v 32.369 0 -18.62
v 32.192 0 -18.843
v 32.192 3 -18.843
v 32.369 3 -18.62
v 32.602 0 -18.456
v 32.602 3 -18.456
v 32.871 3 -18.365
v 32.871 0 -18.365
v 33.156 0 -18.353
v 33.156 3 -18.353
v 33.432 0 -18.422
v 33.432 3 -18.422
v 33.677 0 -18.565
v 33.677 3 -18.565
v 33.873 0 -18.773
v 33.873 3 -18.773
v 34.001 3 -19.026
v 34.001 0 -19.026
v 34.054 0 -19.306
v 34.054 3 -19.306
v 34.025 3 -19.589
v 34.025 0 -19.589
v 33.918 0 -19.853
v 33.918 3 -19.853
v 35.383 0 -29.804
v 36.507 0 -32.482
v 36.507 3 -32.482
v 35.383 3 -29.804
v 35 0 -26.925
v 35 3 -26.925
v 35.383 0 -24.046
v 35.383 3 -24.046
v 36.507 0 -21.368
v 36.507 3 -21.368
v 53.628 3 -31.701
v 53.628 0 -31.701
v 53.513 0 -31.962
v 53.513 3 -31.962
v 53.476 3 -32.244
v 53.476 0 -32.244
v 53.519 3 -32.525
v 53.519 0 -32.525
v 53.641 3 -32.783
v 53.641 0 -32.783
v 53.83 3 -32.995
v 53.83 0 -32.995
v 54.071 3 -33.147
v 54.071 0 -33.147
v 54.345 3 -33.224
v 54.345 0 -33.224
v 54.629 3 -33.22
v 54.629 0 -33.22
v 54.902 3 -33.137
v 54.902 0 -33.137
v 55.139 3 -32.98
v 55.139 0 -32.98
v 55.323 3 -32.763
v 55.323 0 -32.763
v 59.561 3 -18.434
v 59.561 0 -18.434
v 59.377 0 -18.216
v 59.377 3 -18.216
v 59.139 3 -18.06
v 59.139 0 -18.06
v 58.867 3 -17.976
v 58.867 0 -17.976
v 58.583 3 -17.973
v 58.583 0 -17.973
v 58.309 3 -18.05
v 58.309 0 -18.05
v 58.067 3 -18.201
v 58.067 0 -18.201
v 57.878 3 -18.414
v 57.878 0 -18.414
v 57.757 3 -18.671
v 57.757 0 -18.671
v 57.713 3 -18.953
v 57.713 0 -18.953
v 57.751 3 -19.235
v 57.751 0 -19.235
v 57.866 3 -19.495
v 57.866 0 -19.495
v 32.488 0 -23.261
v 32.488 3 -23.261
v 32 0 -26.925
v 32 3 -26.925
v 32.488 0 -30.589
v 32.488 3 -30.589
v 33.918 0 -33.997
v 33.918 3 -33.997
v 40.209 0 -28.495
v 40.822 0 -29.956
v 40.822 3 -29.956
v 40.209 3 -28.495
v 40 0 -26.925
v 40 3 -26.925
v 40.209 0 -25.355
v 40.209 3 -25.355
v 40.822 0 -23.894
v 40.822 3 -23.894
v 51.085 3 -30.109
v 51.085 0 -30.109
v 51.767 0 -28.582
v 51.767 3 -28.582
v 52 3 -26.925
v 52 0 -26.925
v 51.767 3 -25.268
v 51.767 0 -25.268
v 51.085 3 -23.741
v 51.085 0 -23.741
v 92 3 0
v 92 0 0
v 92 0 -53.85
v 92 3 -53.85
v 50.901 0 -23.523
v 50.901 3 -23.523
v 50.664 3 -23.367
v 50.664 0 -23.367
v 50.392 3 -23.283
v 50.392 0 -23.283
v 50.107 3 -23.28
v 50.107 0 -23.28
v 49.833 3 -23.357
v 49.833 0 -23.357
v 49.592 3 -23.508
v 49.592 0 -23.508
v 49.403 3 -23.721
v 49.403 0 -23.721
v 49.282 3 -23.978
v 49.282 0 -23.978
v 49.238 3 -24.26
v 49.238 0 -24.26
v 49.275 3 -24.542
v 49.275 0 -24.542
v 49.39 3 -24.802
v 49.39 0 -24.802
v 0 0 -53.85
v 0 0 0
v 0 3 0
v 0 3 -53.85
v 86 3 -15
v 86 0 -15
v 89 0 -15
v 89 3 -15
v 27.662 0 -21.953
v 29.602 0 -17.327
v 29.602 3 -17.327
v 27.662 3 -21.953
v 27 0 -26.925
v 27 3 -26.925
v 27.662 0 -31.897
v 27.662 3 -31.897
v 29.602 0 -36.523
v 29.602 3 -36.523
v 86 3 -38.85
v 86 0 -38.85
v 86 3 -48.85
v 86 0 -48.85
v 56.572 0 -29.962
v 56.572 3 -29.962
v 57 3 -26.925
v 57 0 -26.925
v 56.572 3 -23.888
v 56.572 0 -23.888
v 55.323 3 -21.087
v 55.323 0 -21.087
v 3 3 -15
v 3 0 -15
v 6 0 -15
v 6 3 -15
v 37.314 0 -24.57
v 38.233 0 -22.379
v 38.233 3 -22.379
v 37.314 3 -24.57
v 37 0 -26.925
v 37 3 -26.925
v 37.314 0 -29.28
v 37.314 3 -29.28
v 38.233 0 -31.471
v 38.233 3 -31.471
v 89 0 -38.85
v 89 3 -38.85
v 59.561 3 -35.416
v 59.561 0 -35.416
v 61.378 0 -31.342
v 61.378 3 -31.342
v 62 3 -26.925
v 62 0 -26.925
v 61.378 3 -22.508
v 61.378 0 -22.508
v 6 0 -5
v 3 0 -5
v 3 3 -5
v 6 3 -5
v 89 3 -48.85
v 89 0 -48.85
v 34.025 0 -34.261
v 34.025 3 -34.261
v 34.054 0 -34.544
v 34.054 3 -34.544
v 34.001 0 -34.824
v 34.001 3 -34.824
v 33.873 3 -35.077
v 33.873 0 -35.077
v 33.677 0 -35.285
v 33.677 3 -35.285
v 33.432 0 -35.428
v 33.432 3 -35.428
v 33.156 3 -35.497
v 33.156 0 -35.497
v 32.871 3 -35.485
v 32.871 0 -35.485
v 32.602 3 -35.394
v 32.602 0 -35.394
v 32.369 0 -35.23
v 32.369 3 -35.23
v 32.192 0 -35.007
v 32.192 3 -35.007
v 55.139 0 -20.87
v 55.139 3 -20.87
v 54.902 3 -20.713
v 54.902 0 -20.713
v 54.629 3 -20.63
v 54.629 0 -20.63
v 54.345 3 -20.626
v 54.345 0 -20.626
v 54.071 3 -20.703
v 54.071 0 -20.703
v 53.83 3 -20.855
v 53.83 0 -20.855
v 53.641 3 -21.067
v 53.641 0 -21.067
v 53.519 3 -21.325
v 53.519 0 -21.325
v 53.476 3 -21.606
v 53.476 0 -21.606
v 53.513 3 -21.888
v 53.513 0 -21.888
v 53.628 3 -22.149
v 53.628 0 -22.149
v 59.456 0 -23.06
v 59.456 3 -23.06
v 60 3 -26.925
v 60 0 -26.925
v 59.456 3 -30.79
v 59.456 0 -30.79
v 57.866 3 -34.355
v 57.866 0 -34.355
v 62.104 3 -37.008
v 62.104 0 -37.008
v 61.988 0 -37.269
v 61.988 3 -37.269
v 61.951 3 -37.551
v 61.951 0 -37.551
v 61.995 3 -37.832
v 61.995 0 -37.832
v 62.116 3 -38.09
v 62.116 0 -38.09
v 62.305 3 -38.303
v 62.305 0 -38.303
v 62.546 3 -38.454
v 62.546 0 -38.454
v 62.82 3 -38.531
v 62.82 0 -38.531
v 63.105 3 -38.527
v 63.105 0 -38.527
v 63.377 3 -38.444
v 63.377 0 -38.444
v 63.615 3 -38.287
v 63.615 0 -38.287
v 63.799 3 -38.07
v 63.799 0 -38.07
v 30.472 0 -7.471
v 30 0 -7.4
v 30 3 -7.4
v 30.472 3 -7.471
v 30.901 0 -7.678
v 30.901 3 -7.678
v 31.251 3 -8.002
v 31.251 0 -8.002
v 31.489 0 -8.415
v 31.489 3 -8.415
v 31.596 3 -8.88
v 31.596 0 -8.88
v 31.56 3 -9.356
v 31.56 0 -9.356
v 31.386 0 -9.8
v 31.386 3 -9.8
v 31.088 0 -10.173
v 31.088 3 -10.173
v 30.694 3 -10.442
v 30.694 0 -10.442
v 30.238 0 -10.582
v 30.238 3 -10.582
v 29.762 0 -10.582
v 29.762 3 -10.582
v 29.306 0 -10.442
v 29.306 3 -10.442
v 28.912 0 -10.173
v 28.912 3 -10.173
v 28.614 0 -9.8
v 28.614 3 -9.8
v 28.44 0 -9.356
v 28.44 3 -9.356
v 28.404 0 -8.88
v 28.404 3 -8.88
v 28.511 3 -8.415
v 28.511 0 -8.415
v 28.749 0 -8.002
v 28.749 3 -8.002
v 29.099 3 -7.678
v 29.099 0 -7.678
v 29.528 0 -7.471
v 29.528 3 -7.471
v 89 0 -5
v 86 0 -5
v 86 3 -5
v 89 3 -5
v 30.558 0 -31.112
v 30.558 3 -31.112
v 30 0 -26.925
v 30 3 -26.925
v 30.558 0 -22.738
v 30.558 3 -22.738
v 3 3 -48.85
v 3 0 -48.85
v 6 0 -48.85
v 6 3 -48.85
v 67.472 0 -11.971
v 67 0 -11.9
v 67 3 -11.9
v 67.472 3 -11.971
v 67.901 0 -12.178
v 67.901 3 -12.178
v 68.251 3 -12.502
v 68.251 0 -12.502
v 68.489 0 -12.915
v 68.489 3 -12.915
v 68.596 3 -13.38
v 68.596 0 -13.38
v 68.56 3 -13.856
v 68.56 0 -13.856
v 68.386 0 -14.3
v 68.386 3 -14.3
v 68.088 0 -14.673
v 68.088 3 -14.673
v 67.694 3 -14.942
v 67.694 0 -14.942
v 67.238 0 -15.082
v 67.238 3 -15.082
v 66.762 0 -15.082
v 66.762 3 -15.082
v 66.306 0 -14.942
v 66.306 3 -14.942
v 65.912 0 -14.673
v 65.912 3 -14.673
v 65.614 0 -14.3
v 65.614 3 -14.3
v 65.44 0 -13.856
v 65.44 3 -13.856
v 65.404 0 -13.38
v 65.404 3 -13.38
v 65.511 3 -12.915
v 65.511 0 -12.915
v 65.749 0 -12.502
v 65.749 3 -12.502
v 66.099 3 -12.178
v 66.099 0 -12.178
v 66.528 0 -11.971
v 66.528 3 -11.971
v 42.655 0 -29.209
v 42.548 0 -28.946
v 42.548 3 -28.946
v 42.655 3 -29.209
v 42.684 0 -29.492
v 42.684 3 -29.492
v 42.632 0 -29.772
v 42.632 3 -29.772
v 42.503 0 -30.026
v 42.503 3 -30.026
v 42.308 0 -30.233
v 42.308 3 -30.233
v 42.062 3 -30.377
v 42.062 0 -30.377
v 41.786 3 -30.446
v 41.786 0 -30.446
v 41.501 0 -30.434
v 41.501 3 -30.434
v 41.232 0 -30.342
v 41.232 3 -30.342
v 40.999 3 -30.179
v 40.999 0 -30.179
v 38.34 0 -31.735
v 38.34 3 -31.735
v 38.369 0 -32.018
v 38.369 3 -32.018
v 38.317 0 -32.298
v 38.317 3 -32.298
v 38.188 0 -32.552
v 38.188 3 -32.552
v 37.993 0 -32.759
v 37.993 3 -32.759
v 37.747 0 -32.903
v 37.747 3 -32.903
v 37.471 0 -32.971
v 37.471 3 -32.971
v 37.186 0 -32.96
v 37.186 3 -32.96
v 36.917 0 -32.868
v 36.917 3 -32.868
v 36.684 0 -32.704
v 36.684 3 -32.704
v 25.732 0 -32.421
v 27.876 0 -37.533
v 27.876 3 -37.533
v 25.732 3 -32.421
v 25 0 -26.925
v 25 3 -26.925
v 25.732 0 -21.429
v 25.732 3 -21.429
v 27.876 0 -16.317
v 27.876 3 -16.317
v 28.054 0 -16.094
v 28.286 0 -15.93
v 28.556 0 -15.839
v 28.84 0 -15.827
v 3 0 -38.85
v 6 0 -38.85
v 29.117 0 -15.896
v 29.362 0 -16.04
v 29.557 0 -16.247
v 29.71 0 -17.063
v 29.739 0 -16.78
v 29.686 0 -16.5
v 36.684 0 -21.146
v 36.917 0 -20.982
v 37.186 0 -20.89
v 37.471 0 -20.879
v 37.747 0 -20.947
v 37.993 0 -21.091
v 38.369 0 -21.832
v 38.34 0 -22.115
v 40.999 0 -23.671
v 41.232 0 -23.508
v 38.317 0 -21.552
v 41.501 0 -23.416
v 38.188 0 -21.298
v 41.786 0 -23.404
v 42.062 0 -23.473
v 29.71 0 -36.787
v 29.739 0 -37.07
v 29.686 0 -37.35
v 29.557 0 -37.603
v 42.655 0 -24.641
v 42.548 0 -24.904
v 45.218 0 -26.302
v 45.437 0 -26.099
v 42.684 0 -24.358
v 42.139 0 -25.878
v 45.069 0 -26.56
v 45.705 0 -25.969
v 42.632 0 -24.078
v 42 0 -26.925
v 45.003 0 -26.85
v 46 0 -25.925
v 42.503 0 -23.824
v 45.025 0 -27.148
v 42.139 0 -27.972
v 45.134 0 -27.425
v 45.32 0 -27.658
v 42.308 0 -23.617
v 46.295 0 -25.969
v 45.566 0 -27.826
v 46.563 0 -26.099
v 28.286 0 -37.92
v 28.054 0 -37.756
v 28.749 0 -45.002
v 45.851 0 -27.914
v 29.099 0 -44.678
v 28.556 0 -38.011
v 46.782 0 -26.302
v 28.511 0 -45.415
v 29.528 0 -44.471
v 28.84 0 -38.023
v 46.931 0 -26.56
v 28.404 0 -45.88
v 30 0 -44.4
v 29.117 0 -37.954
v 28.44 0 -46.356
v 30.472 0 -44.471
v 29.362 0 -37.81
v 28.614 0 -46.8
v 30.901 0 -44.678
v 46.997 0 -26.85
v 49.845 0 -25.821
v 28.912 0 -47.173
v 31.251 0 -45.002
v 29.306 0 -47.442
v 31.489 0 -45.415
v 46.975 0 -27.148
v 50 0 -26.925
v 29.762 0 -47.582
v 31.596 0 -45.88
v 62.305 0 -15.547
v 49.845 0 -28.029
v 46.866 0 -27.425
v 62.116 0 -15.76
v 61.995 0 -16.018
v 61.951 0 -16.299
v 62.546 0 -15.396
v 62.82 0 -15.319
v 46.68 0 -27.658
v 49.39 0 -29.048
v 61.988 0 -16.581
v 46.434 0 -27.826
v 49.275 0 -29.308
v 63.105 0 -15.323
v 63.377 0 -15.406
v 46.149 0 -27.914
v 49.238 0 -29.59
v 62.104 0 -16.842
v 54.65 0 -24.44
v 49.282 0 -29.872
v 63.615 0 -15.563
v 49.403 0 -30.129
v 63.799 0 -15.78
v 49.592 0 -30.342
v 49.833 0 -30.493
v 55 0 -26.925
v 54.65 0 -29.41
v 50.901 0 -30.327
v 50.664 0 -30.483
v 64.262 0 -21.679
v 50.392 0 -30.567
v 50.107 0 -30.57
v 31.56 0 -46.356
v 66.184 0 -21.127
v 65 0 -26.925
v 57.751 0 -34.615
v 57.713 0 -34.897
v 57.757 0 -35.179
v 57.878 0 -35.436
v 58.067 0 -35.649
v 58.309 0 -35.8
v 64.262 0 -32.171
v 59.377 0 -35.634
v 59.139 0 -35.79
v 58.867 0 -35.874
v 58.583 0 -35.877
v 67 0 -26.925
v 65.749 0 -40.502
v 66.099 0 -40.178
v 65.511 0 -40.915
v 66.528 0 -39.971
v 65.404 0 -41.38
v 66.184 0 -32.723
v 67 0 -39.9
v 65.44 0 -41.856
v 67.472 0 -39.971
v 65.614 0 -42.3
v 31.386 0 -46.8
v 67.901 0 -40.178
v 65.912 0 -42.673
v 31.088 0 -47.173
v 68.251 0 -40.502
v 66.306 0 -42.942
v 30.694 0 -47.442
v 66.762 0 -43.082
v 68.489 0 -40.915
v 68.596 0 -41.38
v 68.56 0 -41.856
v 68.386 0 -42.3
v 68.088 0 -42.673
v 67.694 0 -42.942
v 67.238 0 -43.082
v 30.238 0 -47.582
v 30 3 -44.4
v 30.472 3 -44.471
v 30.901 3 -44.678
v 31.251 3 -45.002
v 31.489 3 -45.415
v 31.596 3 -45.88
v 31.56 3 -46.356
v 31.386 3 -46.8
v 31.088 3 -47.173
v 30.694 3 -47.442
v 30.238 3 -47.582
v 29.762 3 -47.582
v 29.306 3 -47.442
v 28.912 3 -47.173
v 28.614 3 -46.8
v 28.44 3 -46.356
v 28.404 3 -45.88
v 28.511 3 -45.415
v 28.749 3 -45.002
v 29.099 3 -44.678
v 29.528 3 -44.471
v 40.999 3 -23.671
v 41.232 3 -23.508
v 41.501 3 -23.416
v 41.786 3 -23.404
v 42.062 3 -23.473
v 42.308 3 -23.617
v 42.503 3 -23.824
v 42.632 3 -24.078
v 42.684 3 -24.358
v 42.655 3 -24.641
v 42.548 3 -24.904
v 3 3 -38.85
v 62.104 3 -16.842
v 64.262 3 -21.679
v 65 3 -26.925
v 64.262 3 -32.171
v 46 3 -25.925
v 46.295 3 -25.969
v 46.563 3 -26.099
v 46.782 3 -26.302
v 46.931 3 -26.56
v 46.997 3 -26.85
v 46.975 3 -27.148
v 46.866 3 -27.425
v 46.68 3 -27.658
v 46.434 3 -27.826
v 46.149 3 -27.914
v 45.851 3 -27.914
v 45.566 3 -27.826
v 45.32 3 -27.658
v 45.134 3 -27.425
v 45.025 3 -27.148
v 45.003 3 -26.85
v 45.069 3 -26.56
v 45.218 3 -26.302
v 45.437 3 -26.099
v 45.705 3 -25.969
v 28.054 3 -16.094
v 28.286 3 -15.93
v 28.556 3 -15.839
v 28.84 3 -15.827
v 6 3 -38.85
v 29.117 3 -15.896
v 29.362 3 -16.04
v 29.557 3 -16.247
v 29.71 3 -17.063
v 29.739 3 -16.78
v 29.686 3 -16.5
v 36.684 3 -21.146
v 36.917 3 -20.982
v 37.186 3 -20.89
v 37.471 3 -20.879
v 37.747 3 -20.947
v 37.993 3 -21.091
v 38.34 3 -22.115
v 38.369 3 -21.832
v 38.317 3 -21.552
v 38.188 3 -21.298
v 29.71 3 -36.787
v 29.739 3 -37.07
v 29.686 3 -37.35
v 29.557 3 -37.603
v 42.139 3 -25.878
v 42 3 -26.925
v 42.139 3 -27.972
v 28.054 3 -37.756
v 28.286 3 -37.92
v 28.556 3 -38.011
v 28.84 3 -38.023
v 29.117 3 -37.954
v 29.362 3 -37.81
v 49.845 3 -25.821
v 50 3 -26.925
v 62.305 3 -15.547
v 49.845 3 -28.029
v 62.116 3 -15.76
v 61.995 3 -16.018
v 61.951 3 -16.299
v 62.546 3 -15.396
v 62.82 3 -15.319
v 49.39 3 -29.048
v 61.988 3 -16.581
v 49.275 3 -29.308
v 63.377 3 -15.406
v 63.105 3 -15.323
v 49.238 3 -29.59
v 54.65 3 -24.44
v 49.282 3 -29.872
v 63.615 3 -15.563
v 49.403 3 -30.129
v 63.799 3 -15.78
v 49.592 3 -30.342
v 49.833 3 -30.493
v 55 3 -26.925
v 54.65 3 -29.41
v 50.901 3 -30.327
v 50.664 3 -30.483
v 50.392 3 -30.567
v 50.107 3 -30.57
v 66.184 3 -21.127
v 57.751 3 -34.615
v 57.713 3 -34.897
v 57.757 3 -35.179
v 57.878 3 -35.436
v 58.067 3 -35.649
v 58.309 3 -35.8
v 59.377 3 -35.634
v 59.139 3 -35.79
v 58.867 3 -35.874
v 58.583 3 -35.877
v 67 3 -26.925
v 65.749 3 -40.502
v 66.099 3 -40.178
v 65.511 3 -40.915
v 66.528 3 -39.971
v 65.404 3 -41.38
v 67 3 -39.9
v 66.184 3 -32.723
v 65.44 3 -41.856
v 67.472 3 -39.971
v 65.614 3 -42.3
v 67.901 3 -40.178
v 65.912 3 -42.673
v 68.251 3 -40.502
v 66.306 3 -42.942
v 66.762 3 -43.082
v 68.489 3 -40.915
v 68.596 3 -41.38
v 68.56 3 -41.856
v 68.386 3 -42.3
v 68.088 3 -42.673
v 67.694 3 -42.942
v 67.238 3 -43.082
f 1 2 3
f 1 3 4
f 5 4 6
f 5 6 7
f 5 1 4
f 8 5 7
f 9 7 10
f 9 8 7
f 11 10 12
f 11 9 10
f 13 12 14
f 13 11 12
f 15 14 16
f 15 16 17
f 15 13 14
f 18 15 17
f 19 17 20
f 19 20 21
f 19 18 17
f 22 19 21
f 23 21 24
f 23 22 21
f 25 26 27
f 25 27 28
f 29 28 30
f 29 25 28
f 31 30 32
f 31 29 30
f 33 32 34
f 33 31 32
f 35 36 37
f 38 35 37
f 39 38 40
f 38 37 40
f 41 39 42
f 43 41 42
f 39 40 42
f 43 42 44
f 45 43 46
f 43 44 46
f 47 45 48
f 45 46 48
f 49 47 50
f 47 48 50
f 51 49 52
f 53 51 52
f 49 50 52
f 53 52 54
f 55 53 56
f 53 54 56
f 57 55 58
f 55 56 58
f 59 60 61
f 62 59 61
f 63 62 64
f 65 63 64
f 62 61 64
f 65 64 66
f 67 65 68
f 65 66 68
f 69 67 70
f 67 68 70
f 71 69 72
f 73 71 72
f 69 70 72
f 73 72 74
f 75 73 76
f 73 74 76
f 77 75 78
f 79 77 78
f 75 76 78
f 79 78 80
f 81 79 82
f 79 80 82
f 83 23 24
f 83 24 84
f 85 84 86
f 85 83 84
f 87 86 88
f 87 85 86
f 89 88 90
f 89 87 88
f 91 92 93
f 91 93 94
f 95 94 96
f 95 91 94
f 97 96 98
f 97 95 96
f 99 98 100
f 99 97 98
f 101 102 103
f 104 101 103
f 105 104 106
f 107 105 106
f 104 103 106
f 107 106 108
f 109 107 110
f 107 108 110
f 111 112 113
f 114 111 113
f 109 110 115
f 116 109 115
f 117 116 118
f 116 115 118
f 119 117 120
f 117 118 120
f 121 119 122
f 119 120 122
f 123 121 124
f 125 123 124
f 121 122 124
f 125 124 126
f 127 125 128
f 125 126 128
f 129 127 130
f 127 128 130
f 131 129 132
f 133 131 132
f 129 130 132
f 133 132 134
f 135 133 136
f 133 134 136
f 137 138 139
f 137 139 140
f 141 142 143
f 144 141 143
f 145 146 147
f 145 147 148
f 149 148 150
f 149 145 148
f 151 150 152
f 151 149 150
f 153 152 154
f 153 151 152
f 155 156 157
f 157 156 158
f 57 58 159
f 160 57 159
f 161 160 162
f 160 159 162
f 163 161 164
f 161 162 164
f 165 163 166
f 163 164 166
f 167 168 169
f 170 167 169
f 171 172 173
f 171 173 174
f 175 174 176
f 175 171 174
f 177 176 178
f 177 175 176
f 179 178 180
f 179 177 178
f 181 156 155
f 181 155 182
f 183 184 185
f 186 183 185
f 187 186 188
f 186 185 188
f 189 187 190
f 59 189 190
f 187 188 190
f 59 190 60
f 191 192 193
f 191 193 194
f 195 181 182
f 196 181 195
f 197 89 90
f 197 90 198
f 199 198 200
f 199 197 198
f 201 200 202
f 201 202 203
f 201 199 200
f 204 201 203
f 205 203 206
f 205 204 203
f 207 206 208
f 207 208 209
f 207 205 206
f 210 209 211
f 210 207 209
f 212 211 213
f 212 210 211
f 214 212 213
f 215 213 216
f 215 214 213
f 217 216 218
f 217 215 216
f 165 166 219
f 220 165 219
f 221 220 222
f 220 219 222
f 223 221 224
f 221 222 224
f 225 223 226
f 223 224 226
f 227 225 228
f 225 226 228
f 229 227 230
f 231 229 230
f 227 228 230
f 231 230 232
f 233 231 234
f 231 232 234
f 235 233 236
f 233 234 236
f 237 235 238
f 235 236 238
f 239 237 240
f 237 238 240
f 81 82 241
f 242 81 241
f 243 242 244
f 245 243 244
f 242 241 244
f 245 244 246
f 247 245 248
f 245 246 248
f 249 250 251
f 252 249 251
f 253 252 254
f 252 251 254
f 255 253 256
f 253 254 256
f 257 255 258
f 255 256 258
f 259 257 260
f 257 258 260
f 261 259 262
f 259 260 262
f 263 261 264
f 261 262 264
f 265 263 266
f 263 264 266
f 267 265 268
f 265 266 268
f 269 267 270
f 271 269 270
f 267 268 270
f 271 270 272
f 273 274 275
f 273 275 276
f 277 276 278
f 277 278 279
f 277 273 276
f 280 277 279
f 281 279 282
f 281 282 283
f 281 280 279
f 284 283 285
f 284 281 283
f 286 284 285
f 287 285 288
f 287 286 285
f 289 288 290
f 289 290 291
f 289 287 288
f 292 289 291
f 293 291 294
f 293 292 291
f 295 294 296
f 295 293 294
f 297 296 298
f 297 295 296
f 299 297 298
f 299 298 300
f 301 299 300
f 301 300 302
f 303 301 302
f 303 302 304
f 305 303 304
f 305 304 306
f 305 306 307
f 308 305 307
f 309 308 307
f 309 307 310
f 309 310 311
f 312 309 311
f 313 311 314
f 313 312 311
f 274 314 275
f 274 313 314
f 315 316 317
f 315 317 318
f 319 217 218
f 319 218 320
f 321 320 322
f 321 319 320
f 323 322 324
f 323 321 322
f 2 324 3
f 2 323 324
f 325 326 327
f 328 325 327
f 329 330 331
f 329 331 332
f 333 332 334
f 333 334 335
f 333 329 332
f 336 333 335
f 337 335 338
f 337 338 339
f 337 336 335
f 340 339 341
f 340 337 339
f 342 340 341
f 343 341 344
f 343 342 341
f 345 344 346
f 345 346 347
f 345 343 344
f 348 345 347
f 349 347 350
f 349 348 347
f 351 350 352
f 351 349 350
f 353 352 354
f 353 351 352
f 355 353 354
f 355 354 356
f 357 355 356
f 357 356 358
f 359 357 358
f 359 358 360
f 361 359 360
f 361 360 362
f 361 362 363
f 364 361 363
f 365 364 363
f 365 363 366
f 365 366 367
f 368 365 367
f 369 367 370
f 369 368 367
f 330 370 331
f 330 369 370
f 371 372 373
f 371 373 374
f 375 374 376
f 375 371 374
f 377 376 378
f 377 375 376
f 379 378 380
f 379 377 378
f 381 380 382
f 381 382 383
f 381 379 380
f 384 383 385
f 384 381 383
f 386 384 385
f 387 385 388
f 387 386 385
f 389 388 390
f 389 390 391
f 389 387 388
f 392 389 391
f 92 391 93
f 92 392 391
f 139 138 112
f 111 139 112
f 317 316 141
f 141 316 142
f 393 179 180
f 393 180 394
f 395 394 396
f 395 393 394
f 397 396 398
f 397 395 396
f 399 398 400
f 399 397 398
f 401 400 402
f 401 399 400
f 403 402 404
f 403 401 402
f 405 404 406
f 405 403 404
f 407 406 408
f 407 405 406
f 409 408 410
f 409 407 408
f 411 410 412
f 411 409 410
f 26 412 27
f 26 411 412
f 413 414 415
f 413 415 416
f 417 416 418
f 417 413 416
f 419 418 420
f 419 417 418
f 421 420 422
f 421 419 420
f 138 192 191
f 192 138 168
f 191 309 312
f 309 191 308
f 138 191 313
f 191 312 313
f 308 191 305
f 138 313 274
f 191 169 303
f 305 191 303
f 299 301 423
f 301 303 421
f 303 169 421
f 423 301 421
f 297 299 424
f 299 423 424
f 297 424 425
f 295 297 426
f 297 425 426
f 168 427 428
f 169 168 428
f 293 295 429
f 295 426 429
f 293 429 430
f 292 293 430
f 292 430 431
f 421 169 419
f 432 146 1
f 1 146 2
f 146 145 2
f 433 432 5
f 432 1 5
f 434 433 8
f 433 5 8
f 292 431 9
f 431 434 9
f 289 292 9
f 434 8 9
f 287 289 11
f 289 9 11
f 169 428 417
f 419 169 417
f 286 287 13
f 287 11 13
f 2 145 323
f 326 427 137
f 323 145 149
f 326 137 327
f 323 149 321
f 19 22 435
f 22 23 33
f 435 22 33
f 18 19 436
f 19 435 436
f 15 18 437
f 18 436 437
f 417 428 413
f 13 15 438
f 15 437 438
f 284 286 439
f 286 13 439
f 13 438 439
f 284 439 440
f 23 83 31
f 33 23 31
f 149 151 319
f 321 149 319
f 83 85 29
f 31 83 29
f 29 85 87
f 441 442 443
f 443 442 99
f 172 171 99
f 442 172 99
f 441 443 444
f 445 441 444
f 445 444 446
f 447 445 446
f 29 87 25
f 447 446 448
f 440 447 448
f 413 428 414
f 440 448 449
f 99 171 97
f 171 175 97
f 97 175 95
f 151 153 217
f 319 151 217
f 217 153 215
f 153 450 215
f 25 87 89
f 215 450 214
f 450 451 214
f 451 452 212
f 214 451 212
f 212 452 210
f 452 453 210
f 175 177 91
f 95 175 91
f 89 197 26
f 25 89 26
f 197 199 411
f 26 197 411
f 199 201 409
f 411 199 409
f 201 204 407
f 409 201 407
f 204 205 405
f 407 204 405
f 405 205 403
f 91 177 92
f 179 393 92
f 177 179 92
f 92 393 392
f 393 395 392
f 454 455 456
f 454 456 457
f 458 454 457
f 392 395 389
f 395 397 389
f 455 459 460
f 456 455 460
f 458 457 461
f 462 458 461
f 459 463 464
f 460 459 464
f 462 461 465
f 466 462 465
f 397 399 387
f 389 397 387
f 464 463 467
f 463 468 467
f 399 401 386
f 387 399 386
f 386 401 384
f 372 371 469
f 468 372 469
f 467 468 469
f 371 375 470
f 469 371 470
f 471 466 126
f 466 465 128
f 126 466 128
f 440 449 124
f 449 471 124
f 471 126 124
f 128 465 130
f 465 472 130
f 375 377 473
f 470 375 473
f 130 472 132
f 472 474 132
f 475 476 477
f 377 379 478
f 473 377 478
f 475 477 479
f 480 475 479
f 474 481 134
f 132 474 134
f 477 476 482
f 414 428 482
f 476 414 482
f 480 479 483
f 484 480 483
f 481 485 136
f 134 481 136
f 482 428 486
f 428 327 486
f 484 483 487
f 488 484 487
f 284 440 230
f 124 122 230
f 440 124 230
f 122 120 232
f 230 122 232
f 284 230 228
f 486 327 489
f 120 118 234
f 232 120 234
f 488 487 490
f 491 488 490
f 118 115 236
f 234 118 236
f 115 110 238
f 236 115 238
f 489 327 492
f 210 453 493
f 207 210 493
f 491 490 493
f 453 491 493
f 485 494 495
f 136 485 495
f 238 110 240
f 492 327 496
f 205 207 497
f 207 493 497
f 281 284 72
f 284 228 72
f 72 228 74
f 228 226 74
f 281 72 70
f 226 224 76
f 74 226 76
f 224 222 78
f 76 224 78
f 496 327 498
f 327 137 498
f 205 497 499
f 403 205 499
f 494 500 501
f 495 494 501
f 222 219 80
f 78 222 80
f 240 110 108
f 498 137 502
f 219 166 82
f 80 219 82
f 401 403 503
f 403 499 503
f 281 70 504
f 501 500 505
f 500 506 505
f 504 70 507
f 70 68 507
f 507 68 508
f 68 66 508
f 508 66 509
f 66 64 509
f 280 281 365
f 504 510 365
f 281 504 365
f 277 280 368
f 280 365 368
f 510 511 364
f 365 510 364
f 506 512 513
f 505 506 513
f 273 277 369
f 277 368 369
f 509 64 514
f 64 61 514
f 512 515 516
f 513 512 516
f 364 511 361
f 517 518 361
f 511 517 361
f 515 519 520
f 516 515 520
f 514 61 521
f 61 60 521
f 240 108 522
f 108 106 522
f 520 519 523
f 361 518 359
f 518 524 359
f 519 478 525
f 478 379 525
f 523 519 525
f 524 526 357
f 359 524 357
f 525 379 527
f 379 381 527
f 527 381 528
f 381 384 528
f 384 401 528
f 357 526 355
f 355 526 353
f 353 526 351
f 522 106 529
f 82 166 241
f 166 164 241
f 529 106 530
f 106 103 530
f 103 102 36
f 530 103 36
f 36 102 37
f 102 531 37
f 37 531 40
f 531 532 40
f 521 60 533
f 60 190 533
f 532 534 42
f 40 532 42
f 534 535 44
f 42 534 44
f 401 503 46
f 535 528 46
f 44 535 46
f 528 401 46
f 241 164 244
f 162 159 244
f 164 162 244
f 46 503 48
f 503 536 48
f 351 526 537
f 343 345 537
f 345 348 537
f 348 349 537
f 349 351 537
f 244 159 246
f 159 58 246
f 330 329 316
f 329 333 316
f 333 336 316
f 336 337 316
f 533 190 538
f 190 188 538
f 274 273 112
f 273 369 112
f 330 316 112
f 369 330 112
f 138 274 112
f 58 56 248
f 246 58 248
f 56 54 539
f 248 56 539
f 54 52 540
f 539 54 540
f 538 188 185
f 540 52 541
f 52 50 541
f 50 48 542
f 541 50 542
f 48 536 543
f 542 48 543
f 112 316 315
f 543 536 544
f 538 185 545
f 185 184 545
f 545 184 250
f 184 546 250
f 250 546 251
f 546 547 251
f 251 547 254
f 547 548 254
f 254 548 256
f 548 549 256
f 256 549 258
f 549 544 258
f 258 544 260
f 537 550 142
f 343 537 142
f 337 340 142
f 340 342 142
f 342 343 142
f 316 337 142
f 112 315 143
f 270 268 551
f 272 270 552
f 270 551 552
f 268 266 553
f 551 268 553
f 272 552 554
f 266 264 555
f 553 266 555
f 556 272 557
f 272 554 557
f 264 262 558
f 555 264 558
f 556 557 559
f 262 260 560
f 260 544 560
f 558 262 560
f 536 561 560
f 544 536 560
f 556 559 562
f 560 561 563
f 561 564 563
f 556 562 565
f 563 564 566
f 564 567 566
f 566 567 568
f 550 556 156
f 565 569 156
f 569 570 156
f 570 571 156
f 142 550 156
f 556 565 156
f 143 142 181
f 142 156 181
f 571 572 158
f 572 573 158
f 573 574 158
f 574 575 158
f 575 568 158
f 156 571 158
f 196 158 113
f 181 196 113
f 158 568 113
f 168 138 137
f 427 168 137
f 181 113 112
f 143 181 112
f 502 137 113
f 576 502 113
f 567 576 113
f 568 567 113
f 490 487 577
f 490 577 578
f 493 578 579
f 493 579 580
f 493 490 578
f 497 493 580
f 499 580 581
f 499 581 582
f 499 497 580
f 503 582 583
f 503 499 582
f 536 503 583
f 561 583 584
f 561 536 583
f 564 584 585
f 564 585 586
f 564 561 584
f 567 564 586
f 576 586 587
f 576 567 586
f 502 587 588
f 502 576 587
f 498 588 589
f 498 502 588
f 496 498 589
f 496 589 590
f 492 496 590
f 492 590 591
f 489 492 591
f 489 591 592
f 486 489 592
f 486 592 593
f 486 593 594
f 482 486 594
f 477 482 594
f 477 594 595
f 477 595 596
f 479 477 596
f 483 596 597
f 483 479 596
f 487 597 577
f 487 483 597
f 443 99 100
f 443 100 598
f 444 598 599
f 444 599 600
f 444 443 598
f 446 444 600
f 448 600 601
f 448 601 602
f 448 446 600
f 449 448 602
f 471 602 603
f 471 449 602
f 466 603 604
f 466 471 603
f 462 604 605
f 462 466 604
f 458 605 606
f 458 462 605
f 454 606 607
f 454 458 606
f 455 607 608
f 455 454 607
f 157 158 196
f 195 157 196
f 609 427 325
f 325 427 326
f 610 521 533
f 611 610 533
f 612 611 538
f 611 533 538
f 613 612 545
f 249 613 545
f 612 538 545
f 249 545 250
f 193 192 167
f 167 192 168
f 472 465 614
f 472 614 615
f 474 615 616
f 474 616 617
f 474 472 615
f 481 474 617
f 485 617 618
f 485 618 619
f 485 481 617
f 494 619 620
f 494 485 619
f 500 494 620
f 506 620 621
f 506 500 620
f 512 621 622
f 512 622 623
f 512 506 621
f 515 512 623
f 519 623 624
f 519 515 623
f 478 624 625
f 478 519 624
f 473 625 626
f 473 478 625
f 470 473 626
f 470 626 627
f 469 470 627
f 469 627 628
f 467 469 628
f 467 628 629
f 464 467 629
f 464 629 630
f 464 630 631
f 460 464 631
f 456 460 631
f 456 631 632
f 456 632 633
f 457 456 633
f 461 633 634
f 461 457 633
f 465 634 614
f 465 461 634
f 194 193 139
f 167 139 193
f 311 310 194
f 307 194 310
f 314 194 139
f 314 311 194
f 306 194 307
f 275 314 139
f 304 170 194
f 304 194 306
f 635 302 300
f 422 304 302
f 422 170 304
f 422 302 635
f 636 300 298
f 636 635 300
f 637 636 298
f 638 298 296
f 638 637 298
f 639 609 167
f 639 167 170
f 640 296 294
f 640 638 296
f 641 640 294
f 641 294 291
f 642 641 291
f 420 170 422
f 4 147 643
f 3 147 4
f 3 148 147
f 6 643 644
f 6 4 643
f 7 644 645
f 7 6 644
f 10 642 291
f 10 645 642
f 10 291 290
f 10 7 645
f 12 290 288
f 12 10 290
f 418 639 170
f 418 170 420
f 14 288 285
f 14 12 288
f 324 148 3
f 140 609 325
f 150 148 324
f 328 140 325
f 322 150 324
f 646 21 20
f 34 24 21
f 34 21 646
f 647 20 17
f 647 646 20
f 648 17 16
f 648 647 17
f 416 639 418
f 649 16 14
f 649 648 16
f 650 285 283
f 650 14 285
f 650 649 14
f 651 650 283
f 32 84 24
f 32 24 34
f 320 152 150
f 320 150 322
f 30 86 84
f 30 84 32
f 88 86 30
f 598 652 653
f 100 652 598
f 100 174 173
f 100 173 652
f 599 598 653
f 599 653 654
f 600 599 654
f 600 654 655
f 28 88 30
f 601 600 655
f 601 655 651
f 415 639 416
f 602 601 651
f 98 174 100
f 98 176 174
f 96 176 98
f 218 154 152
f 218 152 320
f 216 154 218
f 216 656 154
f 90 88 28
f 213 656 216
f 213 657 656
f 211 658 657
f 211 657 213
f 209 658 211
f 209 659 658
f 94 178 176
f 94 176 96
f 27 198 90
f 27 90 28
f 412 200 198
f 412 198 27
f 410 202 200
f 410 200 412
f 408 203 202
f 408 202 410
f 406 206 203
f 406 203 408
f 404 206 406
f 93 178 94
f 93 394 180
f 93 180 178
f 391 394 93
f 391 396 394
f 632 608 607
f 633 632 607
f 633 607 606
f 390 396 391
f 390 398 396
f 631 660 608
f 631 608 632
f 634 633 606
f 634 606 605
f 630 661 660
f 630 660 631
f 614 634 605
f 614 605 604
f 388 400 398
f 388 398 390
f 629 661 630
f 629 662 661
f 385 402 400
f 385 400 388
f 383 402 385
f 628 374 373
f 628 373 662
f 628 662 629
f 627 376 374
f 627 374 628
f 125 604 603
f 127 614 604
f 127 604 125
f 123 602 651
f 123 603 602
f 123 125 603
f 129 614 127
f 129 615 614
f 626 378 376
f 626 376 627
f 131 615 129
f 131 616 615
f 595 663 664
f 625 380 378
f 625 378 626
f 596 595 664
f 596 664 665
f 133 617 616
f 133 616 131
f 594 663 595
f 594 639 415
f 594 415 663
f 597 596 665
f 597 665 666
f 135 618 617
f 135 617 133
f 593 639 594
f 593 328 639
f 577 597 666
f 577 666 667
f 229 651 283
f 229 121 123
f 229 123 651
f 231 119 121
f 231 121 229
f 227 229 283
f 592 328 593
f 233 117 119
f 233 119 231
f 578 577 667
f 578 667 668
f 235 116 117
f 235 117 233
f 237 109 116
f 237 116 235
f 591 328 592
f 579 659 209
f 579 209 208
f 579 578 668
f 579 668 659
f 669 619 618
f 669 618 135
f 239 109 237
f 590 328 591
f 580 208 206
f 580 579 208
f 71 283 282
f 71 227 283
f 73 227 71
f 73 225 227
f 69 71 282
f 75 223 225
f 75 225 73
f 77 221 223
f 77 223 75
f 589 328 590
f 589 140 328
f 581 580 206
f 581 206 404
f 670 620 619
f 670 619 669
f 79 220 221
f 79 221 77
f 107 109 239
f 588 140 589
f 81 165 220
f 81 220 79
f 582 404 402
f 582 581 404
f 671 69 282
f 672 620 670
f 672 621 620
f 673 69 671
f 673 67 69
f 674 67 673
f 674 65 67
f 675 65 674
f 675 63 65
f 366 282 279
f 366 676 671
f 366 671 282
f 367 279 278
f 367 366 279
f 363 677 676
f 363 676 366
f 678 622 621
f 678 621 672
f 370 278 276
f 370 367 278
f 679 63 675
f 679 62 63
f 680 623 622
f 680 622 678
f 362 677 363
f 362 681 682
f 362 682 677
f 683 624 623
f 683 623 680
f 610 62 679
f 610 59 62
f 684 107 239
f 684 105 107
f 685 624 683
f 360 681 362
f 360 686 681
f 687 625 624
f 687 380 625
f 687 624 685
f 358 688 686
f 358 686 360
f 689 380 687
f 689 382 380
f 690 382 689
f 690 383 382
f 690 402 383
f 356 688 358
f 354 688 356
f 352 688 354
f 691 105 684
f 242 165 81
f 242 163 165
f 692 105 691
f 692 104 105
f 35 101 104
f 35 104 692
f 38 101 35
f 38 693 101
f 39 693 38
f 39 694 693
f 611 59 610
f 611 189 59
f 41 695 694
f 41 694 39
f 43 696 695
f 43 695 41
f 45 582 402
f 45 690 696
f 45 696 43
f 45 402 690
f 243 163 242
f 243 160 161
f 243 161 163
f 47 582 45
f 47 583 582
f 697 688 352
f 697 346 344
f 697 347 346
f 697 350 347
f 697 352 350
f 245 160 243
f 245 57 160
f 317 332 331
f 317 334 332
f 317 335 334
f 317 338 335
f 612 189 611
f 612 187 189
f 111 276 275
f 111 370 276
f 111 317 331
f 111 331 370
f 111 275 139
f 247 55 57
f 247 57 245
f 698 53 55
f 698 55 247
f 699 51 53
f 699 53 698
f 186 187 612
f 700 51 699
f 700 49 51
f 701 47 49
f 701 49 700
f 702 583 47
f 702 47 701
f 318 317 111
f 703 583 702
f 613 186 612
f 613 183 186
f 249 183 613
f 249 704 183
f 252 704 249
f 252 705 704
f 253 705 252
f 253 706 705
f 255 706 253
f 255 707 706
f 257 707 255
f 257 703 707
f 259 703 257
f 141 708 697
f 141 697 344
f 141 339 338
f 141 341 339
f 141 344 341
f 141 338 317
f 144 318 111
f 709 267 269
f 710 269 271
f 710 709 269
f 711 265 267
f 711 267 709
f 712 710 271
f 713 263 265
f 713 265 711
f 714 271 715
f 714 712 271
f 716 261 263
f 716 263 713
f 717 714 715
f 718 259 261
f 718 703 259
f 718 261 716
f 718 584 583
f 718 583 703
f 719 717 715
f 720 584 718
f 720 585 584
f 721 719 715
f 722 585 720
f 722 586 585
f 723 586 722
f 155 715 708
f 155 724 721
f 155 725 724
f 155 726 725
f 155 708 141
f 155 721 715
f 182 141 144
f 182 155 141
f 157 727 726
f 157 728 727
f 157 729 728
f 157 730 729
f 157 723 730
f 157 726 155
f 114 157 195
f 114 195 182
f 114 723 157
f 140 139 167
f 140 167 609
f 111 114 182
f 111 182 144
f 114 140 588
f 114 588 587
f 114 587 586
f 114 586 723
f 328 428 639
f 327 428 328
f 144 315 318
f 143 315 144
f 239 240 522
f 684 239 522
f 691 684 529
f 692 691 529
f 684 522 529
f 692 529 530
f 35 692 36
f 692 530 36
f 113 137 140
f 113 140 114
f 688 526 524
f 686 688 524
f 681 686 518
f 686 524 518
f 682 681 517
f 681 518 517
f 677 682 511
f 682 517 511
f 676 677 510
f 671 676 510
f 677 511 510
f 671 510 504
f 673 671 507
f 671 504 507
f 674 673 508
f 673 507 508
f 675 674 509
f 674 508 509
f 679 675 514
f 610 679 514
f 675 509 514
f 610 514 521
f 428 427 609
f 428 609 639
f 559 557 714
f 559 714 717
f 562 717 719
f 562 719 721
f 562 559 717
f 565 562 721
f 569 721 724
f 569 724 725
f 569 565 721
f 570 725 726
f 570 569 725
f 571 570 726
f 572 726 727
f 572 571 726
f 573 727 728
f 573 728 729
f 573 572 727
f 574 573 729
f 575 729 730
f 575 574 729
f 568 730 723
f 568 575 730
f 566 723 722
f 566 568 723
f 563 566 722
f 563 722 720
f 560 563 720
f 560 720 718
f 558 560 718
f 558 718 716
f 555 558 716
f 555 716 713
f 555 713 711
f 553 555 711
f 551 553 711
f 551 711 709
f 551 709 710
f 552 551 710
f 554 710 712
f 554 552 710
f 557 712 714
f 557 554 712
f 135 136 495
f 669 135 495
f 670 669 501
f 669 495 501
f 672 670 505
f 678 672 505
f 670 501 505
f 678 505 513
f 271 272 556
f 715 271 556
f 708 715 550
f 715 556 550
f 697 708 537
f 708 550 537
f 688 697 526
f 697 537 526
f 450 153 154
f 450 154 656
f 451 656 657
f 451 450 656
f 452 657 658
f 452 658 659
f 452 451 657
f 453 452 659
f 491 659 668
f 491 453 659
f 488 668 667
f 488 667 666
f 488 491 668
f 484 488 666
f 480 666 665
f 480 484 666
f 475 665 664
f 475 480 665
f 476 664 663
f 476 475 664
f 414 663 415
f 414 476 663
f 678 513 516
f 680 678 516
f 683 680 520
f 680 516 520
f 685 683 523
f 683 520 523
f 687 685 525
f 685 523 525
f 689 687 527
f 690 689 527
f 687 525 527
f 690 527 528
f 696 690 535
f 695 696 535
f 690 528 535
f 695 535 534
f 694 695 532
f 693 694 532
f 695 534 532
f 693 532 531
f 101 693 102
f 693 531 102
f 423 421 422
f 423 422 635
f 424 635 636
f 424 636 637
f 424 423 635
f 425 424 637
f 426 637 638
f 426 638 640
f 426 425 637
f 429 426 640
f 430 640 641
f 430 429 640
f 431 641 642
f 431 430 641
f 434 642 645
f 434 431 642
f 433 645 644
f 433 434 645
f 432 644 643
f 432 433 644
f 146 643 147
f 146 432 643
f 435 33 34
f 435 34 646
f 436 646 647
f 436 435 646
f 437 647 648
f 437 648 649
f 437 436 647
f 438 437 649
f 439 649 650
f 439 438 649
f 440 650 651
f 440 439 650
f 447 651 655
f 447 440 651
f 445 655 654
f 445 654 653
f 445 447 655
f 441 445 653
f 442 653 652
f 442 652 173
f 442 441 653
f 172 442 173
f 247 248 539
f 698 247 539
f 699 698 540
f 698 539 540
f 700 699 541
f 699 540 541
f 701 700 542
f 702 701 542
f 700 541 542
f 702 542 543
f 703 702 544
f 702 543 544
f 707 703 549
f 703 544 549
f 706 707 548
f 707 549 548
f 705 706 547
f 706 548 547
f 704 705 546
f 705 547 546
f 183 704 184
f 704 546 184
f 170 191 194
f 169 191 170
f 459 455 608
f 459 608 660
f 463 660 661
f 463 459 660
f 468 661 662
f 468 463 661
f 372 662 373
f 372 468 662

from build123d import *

# Parameters (mm, degrees)
SKETCH1_W           = 92
SKETCH1_H           = 53.85
SKETCH1_R           = 1
SKETCH1_R_2         = 1.6
SKETCH1_W_2         = 3
SKETCH1_H_2         = 10
BOSS_EXTRUDE1_DEPTH = 3


with BuildPart() as part:
    # Sketch1 → Boss-Extrude1 (new body)
    with BuildSketch(Plane(origin=(0, 0, 0), x_dir=(1, 0, 0), z_dir=(0, 1, 0))):
        with Locations((46, 26.925)):
            Rectangle(SKETCH1_W, SKETCH1_H)
        with Locations(Location((46, 26.925, 0), (0, 0, 270))):
            Circle(SKETCH1_R, mode=Mode.SUBTRACT)
        with Locations(Location((30, 46, 0), (0, 0, 270))):
            Circle(SKETCH1_R_2, mode=Mode.SUBTRACT)
        with Locations(Location((67, 41.5, 0), (0, 0, 270))):
            Circle(SKETCH1_R_2, mode=Mode.SUBTRACT)
        with Locations(Location((67, 13.5, 0), (0, 0, 270))):
            Circle(SKETCH1_R_2, mode=Mode.SUBTRACT)
        with Locations(Location((30, 9, 0), (0, 0, 270))):
            Circle(SKETCH1_R_2, mode=Mode.SUBTRACT)
        with Locations((4.5, 43.85)):
            Rectangle(SKETCH1_W_2, SKETCH1_H_2, mode=Mode.SUBTRACT)
        with Locations((4.5, 10)):
            Rectangle(SKETCH1_W_2, SKETCH1_H_2, mode=Mode.SUBTRACT)
        with Locations((87.5, 10)):
            Rectangle(SKETCH1_W_2, SKETCH1_H_2, mode=Mode.SUBTRACT)
        with Locations((87.5, 43.85)):
            Rectangle(SKETCH1_W_2, SKETCH1_H_2, mode=Mode.SUBTRACT)
        with BuildLine():
            ThreePointArc((40.82182341, 29.955921841), (40, 26.925), (40.82182341, 23.894078159))
            ThreePointArc((40.82182341, 23.894078159), (42.190006482, 23.536202368), (42.547882273, 24.904385439))
            ThreePointArc((42.547882273, 24.904385439), (42, 26.925), (42.547882273, 28.945614561))
            ThreePointArc((42.547882273, 28.945614561), (42.190006482, 30.313797632), (40.82182341, 29.955921841))
        make_face(mode=Mode.SUBTRACT)
        with BuildLine():
            ThreePointArc((36.506676252, 32.481690042), (35, 26.925), (36.506676252, 21.368309958))
            ThreePointArc((36.506676252, 21.368309958), (37.874859324, 21.010434167), (38.232735115, 22.378617239))
            ThreePointArc((38.232735115, 22.378617239), (37, 26.925), (38.232735115, 31.471382761))
            ThreePointArc((38.232735115, 31.471382761), (37.874859324, 32.839565833), (36.506676252, 32.481690042))
        make_face(mode=Mode.SUBTRACT)
        with BuildLine():
            ThreePointArc((32.191529094, 35.007458242), (30, 26.925), (32.191529094, 18.842541758))
            ThreePointArc((32.191529094, 18.842541758), (33.559712166, 18.484665966), (33.917587957, 19.852849038))
            ThreePointArc((33.917587957, 19.852849038), (32, 26.925), (33.917587957, 33.997150962))
            ThreePointArc((33.917587957, 33.997150962), (33.559712166, 35.365334034), (32.191529094, 35.007458242))
        make_face(mode=Mode.SUBTRACT)
        with BuildLine():
            ThreePointArc((27.876381936, 37.533226443), (25, 26.925), (27.876381936, 16.316773557))
            ThreePointArc((27.876381936, 16.316773557), (29.244565008, 15.958897766), (29.602440799, 17.327080837))
            ThreePointArc((29.602440799, 17.327080837), (27, 26.925), (29.602440799, 36.522919163))
            ThreePointArc((29.602440799, 36.522919163), (29.244565008, 37.891102234), (27.876381936, 37.533226443))
        make_face(mode=Mode.SUBTRACT)
        with BuildLine():
            ThreePointArc((51.08533044, 30.1092447), (52, 26.925), (51.08533044, 23.7407553))
            ThreePointArc((51.08533044, 23.7407553), (49.707067917, 23.423907676), (49.390220294, 24.8021702))
            ThreePointArc((49.390220294, 24.8021702), (50, 26.925), (49.390220294, 29.0478298))
            ThreePointArc((49.390220294, 29.0478298), (49.707067917, 30.426092324), (51.08533044, 30.1092447))
        make_face(mode=Mode.SUBTRACT)
        with BuildLine():
            ThreePointArc((55.323105808, 32.76278195), (57, 26.925), (55.323105808, 21.08721805))
            ThreePointArc((55.323105808, 21.08721805), (53.944843284, 20.770370426), (53.627995661, 22.14863295))
            ThreePointArc((53.627995661, 22.14863295), (55, 26.925), (53.627995661, 31.70136705))
            ThreePointArc((53.627995661, 31.70136705), (53.944843284, 33.079629574), (55.323105808, 32.76278195))
        make_face(mode=Mode.SUBTRACT)
        with BuildLine():
            ThreePointArc((59.560881175, 35.416319201), (62, 26.925), (59.560881175, 18.433680799))
            ThreePointArc((59.560881175, 18.433680799), (58.182618651, 18.116833176), (57.865771028, 19.495095699))
            ThreePointArc((57.865771028, 19.495095699), (60, 26.925), (57.865771028, 34.354904301))
            ThreePointArc((57.865771028, 34.354904301), (58.182618651, 35.733166824), (59.560881175, 35.416319201))
        make_face(mode=Mode.SUBTRACT)
        with BuildLine():
            ThreePointArc((63.798656542, 38.069856451), (67, 26.925), (63.798656542, 15.780143549))
            ThreePointArc((63.798656542, 15.780143549), (62.420394018, 15.463295926), (62.103546395, 16.841558449))
            ThreePointArc((62.103546395, 16.841558449), (65, 26.925), (62.103546395, 37.008441551))
            ThreePointArc((62.103546395, 37.008441551), (62.420394018, 38.386704074), (63.798656542, 38.069856451))
        make_face(mode=Mode.SUBTRACT)
    extrude(amount=BOSS_EXTRUDE1_DEPTH)


solid = part.part
